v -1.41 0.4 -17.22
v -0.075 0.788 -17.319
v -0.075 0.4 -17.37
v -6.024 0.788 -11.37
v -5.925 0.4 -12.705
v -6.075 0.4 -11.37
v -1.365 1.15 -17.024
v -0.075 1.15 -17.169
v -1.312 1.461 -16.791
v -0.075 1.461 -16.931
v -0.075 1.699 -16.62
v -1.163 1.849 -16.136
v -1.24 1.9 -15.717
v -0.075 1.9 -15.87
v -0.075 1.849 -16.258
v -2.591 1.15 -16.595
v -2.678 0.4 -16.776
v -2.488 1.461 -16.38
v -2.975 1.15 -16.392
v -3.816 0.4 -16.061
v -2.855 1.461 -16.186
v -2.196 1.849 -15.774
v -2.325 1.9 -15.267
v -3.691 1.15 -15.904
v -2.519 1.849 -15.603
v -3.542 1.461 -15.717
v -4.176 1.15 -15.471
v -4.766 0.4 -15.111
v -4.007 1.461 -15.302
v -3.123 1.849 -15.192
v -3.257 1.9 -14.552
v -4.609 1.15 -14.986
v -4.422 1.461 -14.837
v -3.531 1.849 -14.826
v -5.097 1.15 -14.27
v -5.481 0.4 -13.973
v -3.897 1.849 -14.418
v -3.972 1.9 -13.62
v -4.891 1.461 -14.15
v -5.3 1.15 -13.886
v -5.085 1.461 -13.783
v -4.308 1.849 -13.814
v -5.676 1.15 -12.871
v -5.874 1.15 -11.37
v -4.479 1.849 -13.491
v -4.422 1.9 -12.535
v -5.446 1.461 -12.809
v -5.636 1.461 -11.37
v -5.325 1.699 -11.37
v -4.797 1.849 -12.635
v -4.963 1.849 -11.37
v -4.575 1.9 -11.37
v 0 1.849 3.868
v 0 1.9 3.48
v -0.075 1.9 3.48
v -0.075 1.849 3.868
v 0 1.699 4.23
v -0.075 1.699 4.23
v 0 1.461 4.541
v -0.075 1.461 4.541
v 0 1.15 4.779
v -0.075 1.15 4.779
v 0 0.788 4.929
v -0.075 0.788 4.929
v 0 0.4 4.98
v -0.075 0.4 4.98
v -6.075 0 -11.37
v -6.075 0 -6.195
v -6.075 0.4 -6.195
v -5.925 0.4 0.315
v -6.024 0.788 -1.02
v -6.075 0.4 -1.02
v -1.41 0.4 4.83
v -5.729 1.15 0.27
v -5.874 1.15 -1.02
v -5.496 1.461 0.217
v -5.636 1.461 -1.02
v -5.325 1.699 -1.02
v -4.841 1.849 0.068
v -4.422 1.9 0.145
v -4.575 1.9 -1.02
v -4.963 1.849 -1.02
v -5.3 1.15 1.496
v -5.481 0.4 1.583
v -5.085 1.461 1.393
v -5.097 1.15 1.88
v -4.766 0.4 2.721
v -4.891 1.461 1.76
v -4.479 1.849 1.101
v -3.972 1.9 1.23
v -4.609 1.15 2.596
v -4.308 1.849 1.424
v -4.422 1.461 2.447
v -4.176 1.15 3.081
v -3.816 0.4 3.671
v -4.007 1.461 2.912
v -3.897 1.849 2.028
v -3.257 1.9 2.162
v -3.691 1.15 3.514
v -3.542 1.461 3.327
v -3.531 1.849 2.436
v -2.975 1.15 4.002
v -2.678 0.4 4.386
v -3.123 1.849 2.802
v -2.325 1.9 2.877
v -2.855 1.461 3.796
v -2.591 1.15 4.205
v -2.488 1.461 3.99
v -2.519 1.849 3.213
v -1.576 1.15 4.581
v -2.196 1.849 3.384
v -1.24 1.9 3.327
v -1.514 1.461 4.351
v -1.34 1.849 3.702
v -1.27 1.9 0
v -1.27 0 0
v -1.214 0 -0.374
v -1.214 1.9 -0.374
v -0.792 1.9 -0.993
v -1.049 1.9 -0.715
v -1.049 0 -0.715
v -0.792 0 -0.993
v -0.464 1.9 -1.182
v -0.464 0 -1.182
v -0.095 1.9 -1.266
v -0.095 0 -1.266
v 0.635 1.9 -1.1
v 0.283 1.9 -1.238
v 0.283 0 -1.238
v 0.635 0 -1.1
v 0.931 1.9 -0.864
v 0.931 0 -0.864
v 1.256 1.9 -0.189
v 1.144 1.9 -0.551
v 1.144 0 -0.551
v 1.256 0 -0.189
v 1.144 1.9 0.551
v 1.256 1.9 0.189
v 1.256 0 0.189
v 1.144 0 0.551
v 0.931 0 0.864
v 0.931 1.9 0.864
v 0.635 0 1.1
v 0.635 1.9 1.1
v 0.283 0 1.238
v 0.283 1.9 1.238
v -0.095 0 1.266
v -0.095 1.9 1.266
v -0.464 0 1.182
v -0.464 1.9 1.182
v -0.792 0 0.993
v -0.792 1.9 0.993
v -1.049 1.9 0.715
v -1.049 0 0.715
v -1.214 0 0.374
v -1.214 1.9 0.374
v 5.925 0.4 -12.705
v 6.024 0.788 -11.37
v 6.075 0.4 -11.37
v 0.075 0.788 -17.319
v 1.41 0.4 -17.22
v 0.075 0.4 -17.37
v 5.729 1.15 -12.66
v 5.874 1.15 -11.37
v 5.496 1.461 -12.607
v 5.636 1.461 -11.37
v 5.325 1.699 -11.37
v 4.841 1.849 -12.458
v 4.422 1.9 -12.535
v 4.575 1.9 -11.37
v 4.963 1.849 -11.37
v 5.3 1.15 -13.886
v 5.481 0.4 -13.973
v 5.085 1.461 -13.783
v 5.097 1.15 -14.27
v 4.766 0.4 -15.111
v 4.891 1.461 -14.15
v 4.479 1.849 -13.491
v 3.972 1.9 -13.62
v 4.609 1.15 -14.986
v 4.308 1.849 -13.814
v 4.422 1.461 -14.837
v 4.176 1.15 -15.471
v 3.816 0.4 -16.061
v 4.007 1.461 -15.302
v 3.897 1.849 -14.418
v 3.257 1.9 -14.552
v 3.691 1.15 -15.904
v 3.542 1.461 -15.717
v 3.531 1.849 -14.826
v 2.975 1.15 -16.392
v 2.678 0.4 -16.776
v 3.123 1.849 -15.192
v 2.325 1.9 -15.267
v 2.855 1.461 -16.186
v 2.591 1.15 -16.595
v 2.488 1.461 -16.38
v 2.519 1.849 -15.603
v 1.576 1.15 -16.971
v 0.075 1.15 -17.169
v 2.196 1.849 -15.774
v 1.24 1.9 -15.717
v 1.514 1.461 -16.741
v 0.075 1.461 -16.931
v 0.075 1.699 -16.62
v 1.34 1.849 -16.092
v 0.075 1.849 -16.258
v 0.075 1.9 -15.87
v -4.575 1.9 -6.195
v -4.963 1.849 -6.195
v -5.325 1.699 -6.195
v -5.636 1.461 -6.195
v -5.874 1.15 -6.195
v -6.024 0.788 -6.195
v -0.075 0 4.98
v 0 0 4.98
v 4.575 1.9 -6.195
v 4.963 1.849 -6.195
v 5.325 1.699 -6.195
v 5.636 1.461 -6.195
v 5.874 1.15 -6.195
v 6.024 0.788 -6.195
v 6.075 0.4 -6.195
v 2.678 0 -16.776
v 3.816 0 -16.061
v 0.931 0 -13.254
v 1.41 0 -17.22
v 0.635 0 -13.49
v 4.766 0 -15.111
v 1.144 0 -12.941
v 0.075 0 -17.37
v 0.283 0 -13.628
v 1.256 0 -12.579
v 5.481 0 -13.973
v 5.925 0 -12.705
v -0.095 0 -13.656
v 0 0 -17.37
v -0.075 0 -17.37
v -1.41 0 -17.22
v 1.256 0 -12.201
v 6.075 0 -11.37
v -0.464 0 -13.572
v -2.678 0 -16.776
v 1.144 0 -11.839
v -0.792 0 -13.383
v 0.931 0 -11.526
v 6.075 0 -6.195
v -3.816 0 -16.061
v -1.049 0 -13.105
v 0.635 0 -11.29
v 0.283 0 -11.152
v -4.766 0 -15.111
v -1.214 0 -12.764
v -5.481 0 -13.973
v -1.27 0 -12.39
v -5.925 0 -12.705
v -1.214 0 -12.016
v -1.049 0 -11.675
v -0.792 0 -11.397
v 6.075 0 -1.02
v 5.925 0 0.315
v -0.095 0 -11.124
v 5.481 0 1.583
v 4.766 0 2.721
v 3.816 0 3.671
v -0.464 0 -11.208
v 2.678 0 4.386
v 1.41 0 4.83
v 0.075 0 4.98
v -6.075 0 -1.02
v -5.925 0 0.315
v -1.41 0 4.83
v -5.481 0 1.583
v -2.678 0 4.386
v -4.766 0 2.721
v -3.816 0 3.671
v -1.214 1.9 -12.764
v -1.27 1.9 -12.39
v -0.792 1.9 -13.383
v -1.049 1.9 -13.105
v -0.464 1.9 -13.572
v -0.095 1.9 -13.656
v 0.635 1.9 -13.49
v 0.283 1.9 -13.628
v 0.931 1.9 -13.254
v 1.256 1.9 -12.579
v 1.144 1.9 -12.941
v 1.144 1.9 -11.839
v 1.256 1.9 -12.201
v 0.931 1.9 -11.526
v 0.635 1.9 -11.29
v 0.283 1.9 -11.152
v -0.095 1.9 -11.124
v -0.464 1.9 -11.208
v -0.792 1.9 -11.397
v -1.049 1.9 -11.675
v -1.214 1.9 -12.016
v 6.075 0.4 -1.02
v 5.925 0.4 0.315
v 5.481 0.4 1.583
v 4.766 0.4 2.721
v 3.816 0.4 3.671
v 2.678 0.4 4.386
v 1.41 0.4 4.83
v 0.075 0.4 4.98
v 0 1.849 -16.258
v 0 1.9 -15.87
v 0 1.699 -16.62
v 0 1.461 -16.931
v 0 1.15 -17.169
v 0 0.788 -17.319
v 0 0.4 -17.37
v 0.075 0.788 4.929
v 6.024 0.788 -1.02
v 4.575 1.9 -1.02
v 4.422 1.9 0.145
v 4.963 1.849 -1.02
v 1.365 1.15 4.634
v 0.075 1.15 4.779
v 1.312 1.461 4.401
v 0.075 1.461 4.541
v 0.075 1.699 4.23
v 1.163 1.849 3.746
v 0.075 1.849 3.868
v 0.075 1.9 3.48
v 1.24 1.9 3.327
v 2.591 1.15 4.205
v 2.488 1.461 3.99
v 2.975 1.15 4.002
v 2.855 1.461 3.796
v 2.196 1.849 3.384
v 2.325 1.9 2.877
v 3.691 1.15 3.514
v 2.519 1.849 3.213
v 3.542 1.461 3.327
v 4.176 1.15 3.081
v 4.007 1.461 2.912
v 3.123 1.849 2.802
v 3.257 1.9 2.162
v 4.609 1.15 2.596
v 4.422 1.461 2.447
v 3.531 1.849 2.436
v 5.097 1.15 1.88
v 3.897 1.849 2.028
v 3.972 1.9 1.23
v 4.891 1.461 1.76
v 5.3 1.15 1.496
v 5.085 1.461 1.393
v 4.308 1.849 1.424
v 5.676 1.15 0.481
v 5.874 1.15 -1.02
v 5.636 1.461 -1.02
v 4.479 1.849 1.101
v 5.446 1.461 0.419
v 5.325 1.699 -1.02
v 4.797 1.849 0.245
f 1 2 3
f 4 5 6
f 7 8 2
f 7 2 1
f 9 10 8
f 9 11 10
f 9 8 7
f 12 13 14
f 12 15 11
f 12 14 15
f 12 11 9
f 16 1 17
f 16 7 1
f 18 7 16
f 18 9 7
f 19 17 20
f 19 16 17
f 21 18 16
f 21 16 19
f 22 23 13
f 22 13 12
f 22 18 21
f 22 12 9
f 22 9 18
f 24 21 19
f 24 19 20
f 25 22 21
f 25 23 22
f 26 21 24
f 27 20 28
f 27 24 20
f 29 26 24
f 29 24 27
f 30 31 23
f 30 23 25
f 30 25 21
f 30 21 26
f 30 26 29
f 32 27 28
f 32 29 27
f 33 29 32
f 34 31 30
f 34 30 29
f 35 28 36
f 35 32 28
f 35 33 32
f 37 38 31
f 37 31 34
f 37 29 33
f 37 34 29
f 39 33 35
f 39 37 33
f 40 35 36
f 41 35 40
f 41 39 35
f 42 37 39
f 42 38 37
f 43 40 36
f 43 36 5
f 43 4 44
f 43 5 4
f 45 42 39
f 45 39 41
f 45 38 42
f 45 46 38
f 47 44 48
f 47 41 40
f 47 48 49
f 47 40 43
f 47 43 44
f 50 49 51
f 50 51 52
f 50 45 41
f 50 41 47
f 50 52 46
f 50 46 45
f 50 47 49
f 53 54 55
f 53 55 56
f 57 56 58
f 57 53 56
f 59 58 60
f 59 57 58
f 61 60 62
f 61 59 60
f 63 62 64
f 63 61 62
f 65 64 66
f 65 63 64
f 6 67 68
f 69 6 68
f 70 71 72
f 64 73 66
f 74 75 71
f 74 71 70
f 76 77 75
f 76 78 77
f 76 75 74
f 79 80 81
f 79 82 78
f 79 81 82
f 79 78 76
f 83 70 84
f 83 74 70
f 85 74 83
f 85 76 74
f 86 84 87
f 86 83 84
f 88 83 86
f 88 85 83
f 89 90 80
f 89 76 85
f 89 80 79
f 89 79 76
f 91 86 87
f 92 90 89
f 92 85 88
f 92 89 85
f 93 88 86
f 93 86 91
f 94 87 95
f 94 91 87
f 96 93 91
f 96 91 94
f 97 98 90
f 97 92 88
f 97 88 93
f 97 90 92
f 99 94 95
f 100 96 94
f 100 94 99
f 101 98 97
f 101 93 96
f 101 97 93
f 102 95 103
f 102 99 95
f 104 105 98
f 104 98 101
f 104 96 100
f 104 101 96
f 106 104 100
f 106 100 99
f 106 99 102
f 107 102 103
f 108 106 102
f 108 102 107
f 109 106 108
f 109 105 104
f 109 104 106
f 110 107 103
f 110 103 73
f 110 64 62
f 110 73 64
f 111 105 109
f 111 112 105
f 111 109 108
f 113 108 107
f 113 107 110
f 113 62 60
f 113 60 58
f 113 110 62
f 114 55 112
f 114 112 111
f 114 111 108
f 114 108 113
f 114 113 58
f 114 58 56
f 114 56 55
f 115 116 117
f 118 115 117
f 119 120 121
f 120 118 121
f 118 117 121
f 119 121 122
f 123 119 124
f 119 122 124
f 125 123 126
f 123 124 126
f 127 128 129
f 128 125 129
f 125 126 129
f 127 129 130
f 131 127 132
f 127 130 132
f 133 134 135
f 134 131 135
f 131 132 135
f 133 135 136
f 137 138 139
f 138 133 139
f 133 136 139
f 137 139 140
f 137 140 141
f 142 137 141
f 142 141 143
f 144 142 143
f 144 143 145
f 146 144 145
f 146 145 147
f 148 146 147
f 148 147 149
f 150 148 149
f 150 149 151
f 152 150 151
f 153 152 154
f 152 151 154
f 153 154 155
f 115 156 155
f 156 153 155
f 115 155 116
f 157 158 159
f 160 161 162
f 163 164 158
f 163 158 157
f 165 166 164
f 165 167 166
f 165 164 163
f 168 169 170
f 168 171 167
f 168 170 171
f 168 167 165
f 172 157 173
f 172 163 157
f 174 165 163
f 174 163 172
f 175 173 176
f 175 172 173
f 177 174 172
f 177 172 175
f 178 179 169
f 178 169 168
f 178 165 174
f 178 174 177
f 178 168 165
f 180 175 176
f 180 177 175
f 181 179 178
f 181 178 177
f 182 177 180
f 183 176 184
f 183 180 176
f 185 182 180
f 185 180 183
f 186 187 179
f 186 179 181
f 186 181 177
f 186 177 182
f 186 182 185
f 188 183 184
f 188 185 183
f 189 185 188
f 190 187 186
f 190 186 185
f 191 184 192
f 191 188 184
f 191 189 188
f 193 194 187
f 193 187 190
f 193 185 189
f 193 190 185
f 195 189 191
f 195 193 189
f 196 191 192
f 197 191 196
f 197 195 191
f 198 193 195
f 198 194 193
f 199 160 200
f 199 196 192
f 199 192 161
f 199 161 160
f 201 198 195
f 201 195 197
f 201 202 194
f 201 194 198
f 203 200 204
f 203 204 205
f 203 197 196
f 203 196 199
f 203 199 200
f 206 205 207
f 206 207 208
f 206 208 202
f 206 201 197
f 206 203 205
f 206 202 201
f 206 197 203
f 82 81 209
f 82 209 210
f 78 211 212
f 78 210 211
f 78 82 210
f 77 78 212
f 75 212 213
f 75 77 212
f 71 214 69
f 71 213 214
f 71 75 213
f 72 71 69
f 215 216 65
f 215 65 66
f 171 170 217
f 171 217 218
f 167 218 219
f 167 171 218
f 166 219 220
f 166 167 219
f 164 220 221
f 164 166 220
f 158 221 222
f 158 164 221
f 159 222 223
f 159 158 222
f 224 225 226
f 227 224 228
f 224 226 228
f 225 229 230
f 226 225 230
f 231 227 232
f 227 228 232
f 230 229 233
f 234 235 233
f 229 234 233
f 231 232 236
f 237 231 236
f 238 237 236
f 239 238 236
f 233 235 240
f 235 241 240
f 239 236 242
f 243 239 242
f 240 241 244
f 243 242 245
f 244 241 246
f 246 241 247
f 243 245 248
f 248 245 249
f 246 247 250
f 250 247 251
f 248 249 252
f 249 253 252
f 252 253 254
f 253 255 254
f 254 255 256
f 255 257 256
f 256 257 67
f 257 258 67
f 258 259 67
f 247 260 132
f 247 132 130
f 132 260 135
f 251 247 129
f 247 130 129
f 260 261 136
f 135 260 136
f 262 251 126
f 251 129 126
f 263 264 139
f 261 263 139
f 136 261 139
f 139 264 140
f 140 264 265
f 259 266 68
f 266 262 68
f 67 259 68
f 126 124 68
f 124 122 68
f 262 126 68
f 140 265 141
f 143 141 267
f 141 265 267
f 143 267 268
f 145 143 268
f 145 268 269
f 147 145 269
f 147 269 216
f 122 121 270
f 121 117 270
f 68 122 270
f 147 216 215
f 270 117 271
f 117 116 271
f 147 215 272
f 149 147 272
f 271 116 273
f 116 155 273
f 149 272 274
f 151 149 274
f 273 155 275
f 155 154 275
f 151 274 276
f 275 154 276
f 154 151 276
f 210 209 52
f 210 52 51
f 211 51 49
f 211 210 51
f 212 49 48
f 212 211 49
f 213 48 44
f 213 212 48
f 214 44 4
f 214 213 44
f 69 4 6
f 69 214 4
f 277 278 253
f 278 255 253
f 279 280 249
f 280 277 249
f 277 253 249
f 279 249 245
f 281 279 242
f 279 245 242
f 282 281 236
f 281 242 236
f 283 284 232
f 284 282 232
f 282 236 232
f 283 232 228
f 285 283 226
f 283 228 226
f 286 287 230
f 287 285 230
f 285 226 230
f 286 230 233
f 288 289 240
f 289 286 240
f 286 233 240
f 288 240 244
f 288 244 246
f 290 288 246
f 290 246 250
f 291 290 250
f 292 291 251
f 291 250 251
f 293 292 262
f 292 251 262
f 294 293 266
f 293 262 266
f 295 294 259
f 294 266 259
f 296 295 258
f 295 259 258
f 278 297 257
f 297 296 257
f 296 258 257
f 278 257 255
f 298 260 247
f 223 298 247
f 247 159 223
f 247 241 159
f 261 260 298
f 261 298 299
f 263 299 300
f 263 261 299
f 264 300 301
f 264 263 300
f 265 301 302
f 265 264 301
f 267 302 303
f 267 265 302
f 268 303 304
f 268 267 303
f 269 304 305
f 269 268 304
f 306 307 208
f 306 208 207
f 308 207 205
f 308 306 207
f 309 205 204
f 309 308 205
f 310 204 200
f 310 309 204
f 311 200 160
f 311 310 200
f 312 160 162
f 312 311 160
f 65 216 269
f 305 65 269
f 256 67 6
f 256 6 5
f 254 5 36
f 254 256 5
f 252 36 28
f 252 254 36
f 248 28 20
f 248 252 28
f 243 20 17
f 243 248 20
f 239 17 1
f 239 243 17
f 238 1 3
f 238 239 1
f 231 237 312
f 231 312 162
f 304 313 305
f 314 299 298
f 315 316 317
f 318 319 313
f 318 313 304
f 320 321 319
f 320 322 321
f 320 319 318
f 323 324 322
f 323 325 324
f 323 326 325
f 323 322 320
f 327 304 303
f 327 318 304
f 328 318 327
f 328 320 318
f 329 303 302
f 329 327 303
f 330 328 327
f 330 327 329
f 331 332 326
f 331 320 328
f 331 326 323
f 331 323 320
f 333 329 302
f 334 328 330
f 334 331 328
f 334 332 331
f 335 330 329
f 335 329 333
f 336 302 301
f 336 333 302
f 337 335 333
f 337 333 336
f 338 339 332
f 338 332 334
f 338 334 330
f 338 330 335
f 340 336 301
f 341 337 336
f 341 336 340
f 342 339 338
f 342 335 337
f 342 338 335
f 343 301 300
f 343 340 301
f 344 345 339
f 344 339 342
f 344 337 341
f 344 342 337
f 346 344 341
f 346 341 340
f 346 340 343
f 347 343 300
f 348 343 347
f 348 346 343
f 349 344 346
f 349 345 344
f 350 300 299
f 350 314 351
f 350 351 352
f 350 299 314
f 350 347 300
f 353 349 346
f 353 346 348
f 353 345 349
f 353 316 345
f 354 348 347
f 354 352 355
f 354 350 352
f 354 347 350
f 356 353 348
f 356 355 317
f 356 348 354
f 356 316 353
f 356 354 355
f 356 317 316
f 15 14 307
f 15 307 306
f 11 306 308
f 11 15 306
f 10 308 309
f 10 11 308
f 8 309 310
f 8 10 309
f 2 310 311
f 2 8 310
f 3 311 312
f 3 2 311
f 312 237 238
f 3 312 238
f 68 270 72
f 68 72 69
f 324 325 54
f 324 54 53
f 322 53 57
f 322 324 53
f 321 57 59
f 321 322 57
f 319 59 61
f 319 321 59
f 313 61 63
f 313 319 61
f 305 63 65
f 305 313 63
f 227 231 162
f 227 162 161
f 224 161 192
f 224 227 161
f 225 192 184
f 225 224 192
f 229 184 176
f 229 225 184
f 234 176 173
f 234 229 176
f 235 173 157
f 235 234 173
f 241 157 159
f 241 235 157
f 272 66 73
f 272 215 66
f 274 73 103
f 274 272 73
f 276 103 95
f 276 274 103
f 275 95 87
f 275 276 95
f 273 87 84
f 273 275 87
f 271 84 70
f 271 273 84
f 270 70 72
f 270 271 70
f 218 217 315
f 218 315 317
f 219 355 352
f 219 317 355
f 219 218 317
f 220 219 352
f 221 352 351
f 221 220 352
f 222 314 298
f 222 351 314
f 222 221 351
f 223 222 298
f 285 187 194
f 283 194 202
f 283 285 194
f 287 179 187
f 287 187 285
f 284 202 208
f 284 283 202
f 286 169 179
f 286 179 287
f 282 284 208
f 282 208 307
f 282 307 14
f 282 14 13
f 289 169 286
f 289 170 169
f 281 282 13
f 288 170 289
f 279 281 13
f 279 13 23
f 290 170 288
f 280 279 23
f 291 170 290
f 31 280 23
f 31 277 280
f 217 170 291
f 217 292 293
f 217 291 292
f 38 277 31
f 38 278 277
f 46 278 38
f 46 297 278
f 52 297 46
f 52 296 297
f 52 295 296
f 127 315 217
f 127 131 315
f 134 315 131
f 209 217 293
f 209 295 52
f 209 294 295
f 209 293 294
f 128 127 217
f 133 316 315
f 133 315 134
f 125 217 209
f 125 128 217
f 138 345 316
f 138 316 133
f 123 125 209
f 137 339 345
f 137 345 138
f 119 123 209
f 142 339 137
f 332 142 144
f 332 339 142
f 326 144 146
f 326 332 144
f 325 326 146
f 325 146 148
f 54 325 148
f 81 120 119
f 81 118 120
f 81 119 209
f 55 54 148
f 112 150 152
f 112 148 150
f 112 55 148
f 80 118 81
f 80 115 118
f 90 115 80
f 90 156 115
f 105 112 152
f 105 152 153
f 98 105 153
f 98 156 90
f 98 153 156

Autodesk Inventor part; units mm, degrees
ref_plane "YZ Plane" through (0, 0, 0) normal (1, 0, 0) x (0, 1, 0)
ref_plane "XZ Plane" through (0, 0, 0) normal (0, 1, 0) x (-1, 0, 0)
ref_plane "XY Plane" through (0, 0, 0) normal (0, 0, 1) x (1, 0, 0)
sketch "Sketch1" plane through (0, 0, 0) normal (0, 1, 0) x (-1, 0, 0)
  circle A0 centre (0, 0) radius 1.27
  line L0 (0, 1.27) -> (0, 4.98) construction
  line L1 (0, 4.98) -> (0, -17.37) construction
  line L2 (0, -6.195) -> (6.075, -6.195) construction
  line L3 (0, 4.98) -> (0.075, 4.98)
  line L4 (6.075, -1.02) -> (6.075, -6.195)
  line L5 (0, 4.98) -> (-0.075, 4.98)
  line L6 (-6.075, -1.02) -> (-6.075, -6.195)
  line L7 (-6.075, -6.195) -> (0, -6.195) construction
  arc A1 (6.075, -1.02) -> (0.075, 4.98) centre (0.075, -1.02) ccw
  arc A2 (-0.075, 4.98) -> (-6.075, -1.02) centre (-0.075, -1.02) ccw
  circle A3 centre (0, -12.39) radius 1.27
  line L8 (0, -13.66) -> (0, -17.37) construction
  line L9 (0, -17.37) -> (0, 4.98) construction
  line L10 (0, -17.37) -> (0.075, -17.37)
  line L11 (0, -17.37) -> (-0.075, -17.37)
  arc A4 (0.075, -17.37) -> (6.075, -11.37) centre (0.075, -11.37) ccw
  arc A5 (-6.075, -11.37) -> (-0.075, -17.37) centre (-0.075, -11.37) ccw
  line L12 (6.075, -11.37) -> (6.075, -6.195)
  line L13 (-6.075, -11.37) -> (-6.075, -6.195)
  point P0 (-6.075, 4.98)
  point P1 (-6.075, -17.37)
  point P2 (6.075, -3.6075)
  dimension "d0" = 2.54
  dimension "d1" = 3.71
  dimension "d2" = 22.35
  dimension "d3" = 6.075
  dimension "d4" = 6.075
  dimension "d5" = 6
  dimension "d6" = 6
  dimension "d7" = 12.15
extrude "Extrusion1" add sketch "Sketch1" along normal blind 1.9
fillet "Fillet1" radius 1.5 8 edges at (6.075, 1.9, -3.6075) (4.3176, 1.9, -15.6126) (-0.0375, 1.9, -17.37) (-4.3176, 1.9, -15.6126) (-6.075, 1.9, -3.6075) (-4.3176, 1.9, 3.2226) (-0.0375, 1.9, 4.98) (4.3176, 1.9, 3.2226)
